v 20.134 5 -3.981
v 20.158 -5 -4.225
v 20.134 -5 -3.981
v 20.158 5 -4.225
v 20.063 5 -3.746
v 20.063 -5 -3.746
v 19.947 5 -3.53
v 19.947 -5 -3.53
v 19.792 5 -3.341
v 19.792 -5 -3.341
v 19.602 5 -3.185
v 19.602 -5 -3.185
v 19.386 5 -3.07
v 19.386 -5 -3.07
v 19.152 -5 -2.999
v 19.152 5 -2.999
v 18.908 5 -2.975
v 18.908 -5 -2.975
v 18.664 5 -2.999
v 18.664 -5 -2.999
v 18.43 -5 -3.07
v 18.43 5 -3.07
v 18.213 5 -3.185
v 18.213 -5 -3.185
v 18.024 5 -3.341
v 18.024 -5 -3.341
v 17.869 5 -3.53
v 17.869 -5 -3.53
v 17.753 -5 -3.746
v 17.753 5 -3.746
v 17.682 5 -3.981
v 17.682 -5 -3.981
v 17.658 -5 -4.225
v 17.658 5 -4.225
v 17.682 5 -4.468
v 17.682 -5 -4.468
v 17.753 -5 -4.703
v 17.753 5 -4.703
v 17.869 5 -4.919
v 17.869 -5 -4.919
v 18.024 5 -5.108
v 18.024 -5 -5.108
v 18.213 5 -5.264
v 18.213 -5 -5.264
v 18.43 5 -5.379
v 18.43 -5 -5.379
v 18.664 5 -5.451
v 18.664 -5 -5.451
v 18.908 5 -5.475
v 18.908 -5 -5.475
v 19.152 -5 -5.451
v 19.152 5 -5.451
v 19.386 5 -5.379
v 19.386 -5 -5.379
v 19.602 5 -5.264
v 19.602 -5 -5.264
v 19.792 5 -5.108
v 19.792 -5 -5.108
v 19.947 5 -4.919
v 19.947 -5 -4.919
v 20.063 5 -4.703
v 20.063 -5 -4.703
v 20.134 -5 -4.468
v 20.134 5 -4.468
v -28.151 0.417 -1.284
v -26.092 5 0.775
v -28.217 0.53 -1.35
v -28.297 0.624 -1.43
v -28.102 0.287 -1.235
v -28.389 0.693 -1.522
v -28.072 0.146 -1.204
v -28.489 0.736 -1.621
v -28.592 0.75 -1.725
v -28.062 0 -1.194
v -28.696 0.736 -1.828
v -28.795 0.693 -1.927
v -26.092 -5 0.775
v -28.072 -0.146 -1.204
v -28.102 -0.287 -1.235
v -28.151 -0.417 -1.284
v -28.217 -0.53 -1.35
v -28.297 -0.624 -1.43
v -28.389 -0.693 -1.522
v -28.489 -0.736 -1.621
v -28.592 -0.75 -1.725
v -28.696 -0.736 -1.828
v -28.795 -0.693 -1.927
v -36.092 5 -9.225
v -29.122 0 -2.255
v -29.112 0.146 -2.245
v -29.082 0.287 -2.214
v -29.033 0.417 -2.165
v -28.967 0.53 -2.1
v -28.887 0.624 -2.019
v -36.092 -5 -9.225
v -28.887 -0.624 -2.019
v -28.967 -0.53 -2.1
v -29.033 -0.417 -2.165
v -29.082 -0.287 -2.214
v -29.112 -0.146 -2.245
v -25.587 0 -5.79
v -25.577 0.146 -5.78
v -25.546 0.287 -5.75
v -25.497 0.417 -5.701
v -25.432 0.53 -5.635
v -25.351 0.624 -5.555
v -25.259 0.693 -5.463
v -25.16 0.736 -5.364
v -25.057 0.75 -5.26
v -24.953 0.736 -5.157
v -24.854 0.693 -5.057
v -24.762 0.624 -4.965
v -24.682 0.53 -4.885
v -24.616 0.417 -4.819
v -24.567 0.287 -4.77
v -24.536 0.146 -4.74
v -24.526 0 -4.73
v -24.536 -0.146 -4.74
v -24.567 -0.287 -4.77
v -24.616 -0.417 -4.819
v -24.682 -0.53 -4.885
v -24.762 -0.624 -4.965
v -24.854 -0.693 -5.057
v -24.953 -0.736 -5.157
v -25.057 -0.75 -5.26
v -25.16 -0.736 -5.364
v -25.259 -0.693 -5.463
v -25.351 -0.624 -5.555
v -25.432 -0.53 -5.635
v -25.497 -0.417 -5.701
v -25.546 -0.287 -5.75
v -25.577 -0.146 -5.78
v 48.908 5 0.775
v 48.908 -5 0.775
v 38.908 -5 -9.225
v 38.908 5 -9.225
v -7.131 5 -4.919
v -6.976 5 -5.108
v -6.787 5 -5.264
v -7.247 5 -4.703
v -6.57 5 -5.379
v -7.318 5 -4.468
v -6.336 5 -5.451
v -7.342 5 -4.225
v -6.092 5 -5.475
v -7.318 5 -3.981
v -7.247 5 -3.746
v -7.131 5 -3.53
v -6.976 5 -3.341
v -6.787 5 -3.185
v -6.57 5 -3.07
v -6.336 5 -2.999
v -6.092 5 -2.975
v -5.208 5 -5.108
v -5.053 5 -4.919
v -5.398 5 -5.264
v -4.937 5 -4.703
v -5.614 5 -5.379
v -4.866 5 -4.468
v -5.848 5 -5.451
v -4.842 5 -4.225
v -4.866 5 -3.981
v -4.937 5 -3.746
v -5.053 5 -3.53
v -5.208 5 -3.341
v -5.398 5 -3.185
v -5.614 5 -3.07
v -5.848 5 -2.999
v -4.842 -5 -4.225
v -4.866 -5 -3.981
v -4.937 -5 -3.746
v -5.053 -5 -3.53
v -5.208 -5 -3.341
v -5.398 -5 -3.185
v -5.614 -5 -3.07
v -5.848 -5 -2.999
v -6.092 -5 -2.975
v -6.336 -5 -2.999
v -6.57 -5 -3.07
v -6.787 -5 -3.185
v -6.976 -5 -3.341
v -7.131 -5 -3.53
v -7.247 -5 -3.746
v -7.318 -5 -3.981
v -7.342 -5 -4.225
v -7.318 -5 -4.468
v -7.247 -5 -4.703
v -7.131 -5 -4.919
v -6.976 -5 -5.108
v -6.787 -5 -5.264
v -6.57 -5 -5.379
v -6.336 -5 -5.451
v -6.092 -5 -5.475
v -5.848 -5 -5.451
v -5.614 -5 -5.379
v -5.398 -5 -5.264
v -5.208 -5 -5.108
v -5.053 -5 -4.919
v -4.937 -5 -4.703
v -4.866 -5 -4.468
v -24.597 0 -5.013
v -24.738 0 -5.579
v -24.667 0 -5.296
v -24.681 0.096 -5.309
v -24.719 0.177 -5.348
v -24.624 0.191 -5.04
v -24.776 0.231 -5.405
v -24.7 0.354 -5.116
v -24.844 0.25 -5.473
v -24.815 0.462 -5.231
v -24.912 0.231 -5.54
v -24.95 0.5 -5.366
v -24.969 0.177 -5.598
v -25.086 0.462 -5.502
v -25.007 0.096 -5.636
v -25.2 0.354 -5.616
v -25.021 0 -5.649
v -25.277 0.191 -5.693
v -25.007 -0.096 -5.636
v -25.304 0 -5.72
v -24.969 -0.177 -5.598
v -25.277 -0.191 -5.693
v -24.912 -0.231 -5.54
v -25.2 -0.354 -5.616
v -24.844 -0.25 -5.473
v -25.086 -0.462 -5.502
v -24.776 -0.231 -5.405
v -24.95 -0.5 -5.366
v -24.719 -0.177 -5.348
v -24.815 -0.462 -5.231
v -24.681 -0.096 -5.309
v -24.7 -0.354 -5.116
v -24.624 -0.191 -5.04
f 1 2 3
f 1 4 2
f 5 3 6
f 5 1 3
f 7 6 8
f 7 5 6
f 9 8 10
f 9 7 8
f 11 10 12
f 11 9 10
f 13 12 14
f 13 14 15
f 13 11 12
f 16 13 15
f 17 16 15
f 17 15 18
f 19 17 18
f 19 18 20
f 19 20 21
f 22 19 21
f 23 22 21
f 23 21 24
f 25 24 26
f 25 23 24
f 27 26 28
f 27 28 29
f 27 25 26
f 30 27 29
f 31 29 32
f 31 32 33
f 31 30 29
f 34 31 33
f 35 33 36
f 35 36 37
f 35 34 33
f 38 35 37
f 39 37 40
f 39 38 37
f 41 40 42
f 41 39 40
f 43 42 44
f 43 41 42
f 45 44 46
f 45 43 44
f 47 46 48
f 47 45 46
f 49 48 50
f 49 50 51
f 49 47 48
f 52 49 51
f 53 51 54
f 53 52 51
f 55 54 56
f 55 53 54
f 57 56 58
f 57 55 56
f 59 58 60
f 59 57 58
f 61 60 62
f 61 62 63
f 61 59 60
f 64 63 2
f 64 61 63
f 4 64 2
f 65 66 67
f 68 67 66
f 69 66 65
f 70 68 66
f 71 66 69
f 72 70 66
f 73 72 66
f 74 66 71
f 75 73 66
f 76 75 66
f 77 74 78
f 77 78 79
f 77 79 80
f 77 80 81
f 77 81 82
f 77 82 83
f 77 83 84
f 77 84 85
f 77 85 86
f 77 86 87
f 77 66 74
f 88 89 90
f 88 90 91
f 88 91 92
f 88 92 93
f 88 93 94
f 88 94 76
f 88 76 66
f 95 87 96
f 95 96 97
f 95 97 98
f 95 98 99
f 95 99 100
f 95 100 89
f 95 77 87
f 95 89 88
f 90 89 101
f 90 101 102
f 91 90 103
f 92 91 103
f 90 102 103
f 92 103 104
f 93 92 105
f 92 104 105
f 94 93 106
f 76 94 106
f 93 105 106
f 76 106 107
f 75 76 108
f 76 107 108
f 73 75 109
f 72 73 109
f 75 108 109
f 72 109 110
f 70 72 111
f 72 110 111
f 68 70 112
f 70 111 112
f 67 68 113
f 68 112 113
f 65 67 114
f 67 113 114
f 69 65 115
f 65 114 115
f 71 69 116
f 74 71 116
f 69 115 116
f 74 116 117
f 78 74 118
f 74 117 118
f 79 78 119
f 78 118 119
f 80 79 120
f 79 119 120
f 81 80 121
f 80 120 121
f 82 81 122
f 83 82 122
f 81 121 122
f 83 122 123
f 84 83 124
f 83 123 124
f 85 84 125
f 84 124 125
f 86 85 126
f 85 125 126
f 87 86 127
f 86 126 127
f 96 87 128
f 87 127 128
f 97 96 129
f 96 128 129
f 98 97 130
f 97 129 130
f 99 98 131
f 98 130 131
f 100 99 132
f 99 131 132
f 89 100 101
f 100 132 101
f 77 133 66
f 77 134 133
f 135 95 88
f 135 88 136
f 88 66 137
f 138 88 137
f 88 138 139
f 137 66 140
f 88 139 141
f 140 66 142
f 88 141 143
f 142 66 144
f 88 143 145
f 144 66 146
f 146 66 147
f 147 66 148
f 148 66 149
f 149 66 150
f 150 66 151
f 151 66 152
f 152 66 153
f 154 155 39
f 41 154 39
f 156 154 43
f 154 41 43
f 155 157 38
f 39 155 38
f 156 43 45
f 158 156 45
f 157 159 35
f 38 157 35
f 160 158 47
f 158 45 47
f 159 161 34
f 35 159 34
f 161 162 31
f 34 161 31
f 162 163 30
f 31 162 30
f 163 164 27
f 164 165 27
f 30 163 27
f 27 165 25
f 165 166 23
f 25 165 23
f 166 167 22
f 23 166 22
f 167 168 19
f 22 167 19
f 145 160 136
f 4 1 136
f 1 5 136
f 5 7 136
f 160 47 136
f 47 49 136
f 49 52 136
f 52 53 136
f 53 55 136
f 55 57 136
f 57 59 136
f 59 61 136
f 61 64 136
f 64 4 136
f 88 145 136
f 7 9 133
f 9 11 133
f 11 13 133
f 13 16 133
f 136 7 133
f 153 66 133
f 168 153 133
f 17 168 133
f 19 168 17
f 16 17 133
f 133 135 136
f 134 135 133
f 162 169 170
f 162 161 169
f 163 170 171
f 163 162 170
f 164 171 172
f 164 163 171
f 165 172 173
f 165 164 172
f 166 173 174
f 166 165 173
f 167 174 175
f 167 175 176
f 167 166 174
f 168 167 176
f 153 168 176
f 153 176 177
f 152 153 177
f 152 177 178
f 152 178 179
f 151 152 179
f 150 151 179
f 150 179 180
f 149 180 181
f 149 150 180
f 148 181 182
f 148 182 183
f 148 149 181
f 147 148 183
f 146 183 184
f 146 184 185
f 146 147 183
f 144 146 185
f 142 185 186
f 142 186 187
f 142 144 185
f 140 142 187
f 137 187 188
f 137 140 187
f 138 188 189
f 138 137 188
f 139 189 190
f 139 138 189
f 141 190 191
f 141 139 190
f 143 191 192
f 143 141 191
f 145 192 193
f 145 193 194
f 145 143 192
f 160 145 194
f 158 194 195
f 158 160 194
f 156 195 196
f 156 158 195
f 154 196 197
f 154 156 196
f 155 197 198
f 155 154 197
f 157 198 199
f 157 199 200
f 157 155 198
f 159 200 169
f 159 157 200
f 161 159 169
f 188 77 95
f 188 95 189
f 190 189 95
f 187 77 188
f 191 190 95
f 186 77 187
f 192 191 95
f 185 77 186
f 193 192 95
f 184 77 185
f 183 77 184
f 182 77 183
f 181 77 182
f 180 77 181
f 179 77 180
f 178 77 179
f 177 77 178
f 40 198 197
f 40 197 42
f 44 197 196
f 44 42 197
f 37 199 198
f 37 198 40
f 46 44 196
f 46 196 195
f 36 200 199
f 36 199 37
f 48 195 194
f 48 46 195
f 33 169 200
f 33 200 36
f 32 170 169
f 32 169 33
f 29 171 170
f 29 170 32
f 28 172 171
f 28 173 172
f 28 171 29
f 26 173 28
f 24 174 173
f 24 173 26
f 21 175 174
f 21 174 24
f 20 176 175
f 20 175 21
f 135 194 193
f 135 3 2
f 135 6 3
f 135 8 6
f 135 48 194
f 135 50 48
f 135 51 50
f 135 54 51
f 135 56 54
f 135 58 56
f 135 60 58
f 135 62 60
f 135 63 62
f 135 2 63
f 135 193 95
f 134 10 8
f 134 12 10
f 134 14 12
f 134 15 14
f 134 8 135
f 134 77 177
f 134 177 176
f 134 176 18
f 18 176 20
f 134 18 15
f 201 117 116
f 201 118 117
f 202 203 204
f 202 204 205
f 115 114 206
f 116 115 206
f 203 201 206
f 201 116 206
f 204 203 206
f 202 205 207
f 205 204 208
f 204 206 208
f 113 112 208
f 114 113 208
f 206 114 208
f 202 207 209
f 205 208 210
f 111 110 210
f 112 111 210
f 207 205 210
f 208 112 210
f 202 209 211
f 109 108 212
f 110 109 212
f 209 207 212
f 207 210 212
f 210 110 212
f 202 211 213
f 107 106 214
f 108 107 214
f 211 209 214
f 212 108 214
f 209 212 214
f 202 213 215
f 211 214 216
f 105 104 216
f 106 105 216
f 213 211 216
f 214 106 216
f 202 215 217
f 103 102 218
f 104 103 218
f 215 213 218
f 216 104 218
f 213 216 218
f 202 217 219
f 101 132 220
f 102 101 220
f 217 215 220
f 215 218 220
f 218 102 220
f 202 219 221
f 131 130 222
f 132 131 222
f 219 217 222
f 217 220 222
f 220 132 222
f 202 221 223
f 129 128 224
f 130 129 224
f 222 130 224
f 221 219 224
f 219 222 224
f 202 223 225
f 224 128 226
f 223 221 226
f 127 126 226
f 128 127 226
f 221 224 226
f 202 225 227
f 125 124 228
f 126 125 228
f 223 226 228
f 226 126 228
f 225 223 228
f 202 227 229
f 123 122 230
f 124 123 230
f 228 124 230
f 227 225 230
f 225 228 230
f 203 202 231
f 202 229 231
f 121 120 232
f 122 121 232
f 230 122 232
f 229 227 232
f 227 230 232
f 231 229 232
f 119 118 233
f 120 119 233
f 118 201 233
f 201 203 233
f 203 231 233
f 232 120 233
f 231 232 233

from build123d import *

# Parameters (mm, degrees)
F0_R     = 1.25
F1_DEPTH = 5
F3_D     = 1.5
F3_DEPTH = 5
F3_TIP   = 0.4506454643


with BuildPart() as f1:
    # F0 (on Front) → F1 (new body, symmetric)
    with BuildSketch(Plane.XZ):
        Polygon((38.9079287648, 0.7754686598), (-26.0920712352, 0.7754686598), (-36.0920712352, -9.2245313402), (38.9079287648, -9.2245313402), (48.9079287648, 0.7754686598), align=None)
        with Locations((-6.0920712352, -4.2245313402)):
            Circle(F0_R, mode=Mode.SUBTRACT)
        with Locations((18.9079287648, -4.2245313402)):
            Circle(F0_R, mode=Mode.SUBTRACT)
    extrude(amount=F1_DEPTH, both=True)

    # F3
    with Locations(Plane(origin=(-13.4337699475, 0, 13.4337699475), x_dir=(0.7071067812, 0, 0.7071067812), z_dir=(-0.7071067812, 0, 0.7071067812))):
        with Locations((-21.4370752636, 0)):
            Hole(F3_D / 2, depth=F3_DEPTH)
            with Locations((0, 0, -(F3_DEPTH + F3_TIP / 2))):  # 118° drill point
                Cone(0, F3_D / 2, F3_TIP, mode=Mode.SUBTRACT)


solid = f1.part
